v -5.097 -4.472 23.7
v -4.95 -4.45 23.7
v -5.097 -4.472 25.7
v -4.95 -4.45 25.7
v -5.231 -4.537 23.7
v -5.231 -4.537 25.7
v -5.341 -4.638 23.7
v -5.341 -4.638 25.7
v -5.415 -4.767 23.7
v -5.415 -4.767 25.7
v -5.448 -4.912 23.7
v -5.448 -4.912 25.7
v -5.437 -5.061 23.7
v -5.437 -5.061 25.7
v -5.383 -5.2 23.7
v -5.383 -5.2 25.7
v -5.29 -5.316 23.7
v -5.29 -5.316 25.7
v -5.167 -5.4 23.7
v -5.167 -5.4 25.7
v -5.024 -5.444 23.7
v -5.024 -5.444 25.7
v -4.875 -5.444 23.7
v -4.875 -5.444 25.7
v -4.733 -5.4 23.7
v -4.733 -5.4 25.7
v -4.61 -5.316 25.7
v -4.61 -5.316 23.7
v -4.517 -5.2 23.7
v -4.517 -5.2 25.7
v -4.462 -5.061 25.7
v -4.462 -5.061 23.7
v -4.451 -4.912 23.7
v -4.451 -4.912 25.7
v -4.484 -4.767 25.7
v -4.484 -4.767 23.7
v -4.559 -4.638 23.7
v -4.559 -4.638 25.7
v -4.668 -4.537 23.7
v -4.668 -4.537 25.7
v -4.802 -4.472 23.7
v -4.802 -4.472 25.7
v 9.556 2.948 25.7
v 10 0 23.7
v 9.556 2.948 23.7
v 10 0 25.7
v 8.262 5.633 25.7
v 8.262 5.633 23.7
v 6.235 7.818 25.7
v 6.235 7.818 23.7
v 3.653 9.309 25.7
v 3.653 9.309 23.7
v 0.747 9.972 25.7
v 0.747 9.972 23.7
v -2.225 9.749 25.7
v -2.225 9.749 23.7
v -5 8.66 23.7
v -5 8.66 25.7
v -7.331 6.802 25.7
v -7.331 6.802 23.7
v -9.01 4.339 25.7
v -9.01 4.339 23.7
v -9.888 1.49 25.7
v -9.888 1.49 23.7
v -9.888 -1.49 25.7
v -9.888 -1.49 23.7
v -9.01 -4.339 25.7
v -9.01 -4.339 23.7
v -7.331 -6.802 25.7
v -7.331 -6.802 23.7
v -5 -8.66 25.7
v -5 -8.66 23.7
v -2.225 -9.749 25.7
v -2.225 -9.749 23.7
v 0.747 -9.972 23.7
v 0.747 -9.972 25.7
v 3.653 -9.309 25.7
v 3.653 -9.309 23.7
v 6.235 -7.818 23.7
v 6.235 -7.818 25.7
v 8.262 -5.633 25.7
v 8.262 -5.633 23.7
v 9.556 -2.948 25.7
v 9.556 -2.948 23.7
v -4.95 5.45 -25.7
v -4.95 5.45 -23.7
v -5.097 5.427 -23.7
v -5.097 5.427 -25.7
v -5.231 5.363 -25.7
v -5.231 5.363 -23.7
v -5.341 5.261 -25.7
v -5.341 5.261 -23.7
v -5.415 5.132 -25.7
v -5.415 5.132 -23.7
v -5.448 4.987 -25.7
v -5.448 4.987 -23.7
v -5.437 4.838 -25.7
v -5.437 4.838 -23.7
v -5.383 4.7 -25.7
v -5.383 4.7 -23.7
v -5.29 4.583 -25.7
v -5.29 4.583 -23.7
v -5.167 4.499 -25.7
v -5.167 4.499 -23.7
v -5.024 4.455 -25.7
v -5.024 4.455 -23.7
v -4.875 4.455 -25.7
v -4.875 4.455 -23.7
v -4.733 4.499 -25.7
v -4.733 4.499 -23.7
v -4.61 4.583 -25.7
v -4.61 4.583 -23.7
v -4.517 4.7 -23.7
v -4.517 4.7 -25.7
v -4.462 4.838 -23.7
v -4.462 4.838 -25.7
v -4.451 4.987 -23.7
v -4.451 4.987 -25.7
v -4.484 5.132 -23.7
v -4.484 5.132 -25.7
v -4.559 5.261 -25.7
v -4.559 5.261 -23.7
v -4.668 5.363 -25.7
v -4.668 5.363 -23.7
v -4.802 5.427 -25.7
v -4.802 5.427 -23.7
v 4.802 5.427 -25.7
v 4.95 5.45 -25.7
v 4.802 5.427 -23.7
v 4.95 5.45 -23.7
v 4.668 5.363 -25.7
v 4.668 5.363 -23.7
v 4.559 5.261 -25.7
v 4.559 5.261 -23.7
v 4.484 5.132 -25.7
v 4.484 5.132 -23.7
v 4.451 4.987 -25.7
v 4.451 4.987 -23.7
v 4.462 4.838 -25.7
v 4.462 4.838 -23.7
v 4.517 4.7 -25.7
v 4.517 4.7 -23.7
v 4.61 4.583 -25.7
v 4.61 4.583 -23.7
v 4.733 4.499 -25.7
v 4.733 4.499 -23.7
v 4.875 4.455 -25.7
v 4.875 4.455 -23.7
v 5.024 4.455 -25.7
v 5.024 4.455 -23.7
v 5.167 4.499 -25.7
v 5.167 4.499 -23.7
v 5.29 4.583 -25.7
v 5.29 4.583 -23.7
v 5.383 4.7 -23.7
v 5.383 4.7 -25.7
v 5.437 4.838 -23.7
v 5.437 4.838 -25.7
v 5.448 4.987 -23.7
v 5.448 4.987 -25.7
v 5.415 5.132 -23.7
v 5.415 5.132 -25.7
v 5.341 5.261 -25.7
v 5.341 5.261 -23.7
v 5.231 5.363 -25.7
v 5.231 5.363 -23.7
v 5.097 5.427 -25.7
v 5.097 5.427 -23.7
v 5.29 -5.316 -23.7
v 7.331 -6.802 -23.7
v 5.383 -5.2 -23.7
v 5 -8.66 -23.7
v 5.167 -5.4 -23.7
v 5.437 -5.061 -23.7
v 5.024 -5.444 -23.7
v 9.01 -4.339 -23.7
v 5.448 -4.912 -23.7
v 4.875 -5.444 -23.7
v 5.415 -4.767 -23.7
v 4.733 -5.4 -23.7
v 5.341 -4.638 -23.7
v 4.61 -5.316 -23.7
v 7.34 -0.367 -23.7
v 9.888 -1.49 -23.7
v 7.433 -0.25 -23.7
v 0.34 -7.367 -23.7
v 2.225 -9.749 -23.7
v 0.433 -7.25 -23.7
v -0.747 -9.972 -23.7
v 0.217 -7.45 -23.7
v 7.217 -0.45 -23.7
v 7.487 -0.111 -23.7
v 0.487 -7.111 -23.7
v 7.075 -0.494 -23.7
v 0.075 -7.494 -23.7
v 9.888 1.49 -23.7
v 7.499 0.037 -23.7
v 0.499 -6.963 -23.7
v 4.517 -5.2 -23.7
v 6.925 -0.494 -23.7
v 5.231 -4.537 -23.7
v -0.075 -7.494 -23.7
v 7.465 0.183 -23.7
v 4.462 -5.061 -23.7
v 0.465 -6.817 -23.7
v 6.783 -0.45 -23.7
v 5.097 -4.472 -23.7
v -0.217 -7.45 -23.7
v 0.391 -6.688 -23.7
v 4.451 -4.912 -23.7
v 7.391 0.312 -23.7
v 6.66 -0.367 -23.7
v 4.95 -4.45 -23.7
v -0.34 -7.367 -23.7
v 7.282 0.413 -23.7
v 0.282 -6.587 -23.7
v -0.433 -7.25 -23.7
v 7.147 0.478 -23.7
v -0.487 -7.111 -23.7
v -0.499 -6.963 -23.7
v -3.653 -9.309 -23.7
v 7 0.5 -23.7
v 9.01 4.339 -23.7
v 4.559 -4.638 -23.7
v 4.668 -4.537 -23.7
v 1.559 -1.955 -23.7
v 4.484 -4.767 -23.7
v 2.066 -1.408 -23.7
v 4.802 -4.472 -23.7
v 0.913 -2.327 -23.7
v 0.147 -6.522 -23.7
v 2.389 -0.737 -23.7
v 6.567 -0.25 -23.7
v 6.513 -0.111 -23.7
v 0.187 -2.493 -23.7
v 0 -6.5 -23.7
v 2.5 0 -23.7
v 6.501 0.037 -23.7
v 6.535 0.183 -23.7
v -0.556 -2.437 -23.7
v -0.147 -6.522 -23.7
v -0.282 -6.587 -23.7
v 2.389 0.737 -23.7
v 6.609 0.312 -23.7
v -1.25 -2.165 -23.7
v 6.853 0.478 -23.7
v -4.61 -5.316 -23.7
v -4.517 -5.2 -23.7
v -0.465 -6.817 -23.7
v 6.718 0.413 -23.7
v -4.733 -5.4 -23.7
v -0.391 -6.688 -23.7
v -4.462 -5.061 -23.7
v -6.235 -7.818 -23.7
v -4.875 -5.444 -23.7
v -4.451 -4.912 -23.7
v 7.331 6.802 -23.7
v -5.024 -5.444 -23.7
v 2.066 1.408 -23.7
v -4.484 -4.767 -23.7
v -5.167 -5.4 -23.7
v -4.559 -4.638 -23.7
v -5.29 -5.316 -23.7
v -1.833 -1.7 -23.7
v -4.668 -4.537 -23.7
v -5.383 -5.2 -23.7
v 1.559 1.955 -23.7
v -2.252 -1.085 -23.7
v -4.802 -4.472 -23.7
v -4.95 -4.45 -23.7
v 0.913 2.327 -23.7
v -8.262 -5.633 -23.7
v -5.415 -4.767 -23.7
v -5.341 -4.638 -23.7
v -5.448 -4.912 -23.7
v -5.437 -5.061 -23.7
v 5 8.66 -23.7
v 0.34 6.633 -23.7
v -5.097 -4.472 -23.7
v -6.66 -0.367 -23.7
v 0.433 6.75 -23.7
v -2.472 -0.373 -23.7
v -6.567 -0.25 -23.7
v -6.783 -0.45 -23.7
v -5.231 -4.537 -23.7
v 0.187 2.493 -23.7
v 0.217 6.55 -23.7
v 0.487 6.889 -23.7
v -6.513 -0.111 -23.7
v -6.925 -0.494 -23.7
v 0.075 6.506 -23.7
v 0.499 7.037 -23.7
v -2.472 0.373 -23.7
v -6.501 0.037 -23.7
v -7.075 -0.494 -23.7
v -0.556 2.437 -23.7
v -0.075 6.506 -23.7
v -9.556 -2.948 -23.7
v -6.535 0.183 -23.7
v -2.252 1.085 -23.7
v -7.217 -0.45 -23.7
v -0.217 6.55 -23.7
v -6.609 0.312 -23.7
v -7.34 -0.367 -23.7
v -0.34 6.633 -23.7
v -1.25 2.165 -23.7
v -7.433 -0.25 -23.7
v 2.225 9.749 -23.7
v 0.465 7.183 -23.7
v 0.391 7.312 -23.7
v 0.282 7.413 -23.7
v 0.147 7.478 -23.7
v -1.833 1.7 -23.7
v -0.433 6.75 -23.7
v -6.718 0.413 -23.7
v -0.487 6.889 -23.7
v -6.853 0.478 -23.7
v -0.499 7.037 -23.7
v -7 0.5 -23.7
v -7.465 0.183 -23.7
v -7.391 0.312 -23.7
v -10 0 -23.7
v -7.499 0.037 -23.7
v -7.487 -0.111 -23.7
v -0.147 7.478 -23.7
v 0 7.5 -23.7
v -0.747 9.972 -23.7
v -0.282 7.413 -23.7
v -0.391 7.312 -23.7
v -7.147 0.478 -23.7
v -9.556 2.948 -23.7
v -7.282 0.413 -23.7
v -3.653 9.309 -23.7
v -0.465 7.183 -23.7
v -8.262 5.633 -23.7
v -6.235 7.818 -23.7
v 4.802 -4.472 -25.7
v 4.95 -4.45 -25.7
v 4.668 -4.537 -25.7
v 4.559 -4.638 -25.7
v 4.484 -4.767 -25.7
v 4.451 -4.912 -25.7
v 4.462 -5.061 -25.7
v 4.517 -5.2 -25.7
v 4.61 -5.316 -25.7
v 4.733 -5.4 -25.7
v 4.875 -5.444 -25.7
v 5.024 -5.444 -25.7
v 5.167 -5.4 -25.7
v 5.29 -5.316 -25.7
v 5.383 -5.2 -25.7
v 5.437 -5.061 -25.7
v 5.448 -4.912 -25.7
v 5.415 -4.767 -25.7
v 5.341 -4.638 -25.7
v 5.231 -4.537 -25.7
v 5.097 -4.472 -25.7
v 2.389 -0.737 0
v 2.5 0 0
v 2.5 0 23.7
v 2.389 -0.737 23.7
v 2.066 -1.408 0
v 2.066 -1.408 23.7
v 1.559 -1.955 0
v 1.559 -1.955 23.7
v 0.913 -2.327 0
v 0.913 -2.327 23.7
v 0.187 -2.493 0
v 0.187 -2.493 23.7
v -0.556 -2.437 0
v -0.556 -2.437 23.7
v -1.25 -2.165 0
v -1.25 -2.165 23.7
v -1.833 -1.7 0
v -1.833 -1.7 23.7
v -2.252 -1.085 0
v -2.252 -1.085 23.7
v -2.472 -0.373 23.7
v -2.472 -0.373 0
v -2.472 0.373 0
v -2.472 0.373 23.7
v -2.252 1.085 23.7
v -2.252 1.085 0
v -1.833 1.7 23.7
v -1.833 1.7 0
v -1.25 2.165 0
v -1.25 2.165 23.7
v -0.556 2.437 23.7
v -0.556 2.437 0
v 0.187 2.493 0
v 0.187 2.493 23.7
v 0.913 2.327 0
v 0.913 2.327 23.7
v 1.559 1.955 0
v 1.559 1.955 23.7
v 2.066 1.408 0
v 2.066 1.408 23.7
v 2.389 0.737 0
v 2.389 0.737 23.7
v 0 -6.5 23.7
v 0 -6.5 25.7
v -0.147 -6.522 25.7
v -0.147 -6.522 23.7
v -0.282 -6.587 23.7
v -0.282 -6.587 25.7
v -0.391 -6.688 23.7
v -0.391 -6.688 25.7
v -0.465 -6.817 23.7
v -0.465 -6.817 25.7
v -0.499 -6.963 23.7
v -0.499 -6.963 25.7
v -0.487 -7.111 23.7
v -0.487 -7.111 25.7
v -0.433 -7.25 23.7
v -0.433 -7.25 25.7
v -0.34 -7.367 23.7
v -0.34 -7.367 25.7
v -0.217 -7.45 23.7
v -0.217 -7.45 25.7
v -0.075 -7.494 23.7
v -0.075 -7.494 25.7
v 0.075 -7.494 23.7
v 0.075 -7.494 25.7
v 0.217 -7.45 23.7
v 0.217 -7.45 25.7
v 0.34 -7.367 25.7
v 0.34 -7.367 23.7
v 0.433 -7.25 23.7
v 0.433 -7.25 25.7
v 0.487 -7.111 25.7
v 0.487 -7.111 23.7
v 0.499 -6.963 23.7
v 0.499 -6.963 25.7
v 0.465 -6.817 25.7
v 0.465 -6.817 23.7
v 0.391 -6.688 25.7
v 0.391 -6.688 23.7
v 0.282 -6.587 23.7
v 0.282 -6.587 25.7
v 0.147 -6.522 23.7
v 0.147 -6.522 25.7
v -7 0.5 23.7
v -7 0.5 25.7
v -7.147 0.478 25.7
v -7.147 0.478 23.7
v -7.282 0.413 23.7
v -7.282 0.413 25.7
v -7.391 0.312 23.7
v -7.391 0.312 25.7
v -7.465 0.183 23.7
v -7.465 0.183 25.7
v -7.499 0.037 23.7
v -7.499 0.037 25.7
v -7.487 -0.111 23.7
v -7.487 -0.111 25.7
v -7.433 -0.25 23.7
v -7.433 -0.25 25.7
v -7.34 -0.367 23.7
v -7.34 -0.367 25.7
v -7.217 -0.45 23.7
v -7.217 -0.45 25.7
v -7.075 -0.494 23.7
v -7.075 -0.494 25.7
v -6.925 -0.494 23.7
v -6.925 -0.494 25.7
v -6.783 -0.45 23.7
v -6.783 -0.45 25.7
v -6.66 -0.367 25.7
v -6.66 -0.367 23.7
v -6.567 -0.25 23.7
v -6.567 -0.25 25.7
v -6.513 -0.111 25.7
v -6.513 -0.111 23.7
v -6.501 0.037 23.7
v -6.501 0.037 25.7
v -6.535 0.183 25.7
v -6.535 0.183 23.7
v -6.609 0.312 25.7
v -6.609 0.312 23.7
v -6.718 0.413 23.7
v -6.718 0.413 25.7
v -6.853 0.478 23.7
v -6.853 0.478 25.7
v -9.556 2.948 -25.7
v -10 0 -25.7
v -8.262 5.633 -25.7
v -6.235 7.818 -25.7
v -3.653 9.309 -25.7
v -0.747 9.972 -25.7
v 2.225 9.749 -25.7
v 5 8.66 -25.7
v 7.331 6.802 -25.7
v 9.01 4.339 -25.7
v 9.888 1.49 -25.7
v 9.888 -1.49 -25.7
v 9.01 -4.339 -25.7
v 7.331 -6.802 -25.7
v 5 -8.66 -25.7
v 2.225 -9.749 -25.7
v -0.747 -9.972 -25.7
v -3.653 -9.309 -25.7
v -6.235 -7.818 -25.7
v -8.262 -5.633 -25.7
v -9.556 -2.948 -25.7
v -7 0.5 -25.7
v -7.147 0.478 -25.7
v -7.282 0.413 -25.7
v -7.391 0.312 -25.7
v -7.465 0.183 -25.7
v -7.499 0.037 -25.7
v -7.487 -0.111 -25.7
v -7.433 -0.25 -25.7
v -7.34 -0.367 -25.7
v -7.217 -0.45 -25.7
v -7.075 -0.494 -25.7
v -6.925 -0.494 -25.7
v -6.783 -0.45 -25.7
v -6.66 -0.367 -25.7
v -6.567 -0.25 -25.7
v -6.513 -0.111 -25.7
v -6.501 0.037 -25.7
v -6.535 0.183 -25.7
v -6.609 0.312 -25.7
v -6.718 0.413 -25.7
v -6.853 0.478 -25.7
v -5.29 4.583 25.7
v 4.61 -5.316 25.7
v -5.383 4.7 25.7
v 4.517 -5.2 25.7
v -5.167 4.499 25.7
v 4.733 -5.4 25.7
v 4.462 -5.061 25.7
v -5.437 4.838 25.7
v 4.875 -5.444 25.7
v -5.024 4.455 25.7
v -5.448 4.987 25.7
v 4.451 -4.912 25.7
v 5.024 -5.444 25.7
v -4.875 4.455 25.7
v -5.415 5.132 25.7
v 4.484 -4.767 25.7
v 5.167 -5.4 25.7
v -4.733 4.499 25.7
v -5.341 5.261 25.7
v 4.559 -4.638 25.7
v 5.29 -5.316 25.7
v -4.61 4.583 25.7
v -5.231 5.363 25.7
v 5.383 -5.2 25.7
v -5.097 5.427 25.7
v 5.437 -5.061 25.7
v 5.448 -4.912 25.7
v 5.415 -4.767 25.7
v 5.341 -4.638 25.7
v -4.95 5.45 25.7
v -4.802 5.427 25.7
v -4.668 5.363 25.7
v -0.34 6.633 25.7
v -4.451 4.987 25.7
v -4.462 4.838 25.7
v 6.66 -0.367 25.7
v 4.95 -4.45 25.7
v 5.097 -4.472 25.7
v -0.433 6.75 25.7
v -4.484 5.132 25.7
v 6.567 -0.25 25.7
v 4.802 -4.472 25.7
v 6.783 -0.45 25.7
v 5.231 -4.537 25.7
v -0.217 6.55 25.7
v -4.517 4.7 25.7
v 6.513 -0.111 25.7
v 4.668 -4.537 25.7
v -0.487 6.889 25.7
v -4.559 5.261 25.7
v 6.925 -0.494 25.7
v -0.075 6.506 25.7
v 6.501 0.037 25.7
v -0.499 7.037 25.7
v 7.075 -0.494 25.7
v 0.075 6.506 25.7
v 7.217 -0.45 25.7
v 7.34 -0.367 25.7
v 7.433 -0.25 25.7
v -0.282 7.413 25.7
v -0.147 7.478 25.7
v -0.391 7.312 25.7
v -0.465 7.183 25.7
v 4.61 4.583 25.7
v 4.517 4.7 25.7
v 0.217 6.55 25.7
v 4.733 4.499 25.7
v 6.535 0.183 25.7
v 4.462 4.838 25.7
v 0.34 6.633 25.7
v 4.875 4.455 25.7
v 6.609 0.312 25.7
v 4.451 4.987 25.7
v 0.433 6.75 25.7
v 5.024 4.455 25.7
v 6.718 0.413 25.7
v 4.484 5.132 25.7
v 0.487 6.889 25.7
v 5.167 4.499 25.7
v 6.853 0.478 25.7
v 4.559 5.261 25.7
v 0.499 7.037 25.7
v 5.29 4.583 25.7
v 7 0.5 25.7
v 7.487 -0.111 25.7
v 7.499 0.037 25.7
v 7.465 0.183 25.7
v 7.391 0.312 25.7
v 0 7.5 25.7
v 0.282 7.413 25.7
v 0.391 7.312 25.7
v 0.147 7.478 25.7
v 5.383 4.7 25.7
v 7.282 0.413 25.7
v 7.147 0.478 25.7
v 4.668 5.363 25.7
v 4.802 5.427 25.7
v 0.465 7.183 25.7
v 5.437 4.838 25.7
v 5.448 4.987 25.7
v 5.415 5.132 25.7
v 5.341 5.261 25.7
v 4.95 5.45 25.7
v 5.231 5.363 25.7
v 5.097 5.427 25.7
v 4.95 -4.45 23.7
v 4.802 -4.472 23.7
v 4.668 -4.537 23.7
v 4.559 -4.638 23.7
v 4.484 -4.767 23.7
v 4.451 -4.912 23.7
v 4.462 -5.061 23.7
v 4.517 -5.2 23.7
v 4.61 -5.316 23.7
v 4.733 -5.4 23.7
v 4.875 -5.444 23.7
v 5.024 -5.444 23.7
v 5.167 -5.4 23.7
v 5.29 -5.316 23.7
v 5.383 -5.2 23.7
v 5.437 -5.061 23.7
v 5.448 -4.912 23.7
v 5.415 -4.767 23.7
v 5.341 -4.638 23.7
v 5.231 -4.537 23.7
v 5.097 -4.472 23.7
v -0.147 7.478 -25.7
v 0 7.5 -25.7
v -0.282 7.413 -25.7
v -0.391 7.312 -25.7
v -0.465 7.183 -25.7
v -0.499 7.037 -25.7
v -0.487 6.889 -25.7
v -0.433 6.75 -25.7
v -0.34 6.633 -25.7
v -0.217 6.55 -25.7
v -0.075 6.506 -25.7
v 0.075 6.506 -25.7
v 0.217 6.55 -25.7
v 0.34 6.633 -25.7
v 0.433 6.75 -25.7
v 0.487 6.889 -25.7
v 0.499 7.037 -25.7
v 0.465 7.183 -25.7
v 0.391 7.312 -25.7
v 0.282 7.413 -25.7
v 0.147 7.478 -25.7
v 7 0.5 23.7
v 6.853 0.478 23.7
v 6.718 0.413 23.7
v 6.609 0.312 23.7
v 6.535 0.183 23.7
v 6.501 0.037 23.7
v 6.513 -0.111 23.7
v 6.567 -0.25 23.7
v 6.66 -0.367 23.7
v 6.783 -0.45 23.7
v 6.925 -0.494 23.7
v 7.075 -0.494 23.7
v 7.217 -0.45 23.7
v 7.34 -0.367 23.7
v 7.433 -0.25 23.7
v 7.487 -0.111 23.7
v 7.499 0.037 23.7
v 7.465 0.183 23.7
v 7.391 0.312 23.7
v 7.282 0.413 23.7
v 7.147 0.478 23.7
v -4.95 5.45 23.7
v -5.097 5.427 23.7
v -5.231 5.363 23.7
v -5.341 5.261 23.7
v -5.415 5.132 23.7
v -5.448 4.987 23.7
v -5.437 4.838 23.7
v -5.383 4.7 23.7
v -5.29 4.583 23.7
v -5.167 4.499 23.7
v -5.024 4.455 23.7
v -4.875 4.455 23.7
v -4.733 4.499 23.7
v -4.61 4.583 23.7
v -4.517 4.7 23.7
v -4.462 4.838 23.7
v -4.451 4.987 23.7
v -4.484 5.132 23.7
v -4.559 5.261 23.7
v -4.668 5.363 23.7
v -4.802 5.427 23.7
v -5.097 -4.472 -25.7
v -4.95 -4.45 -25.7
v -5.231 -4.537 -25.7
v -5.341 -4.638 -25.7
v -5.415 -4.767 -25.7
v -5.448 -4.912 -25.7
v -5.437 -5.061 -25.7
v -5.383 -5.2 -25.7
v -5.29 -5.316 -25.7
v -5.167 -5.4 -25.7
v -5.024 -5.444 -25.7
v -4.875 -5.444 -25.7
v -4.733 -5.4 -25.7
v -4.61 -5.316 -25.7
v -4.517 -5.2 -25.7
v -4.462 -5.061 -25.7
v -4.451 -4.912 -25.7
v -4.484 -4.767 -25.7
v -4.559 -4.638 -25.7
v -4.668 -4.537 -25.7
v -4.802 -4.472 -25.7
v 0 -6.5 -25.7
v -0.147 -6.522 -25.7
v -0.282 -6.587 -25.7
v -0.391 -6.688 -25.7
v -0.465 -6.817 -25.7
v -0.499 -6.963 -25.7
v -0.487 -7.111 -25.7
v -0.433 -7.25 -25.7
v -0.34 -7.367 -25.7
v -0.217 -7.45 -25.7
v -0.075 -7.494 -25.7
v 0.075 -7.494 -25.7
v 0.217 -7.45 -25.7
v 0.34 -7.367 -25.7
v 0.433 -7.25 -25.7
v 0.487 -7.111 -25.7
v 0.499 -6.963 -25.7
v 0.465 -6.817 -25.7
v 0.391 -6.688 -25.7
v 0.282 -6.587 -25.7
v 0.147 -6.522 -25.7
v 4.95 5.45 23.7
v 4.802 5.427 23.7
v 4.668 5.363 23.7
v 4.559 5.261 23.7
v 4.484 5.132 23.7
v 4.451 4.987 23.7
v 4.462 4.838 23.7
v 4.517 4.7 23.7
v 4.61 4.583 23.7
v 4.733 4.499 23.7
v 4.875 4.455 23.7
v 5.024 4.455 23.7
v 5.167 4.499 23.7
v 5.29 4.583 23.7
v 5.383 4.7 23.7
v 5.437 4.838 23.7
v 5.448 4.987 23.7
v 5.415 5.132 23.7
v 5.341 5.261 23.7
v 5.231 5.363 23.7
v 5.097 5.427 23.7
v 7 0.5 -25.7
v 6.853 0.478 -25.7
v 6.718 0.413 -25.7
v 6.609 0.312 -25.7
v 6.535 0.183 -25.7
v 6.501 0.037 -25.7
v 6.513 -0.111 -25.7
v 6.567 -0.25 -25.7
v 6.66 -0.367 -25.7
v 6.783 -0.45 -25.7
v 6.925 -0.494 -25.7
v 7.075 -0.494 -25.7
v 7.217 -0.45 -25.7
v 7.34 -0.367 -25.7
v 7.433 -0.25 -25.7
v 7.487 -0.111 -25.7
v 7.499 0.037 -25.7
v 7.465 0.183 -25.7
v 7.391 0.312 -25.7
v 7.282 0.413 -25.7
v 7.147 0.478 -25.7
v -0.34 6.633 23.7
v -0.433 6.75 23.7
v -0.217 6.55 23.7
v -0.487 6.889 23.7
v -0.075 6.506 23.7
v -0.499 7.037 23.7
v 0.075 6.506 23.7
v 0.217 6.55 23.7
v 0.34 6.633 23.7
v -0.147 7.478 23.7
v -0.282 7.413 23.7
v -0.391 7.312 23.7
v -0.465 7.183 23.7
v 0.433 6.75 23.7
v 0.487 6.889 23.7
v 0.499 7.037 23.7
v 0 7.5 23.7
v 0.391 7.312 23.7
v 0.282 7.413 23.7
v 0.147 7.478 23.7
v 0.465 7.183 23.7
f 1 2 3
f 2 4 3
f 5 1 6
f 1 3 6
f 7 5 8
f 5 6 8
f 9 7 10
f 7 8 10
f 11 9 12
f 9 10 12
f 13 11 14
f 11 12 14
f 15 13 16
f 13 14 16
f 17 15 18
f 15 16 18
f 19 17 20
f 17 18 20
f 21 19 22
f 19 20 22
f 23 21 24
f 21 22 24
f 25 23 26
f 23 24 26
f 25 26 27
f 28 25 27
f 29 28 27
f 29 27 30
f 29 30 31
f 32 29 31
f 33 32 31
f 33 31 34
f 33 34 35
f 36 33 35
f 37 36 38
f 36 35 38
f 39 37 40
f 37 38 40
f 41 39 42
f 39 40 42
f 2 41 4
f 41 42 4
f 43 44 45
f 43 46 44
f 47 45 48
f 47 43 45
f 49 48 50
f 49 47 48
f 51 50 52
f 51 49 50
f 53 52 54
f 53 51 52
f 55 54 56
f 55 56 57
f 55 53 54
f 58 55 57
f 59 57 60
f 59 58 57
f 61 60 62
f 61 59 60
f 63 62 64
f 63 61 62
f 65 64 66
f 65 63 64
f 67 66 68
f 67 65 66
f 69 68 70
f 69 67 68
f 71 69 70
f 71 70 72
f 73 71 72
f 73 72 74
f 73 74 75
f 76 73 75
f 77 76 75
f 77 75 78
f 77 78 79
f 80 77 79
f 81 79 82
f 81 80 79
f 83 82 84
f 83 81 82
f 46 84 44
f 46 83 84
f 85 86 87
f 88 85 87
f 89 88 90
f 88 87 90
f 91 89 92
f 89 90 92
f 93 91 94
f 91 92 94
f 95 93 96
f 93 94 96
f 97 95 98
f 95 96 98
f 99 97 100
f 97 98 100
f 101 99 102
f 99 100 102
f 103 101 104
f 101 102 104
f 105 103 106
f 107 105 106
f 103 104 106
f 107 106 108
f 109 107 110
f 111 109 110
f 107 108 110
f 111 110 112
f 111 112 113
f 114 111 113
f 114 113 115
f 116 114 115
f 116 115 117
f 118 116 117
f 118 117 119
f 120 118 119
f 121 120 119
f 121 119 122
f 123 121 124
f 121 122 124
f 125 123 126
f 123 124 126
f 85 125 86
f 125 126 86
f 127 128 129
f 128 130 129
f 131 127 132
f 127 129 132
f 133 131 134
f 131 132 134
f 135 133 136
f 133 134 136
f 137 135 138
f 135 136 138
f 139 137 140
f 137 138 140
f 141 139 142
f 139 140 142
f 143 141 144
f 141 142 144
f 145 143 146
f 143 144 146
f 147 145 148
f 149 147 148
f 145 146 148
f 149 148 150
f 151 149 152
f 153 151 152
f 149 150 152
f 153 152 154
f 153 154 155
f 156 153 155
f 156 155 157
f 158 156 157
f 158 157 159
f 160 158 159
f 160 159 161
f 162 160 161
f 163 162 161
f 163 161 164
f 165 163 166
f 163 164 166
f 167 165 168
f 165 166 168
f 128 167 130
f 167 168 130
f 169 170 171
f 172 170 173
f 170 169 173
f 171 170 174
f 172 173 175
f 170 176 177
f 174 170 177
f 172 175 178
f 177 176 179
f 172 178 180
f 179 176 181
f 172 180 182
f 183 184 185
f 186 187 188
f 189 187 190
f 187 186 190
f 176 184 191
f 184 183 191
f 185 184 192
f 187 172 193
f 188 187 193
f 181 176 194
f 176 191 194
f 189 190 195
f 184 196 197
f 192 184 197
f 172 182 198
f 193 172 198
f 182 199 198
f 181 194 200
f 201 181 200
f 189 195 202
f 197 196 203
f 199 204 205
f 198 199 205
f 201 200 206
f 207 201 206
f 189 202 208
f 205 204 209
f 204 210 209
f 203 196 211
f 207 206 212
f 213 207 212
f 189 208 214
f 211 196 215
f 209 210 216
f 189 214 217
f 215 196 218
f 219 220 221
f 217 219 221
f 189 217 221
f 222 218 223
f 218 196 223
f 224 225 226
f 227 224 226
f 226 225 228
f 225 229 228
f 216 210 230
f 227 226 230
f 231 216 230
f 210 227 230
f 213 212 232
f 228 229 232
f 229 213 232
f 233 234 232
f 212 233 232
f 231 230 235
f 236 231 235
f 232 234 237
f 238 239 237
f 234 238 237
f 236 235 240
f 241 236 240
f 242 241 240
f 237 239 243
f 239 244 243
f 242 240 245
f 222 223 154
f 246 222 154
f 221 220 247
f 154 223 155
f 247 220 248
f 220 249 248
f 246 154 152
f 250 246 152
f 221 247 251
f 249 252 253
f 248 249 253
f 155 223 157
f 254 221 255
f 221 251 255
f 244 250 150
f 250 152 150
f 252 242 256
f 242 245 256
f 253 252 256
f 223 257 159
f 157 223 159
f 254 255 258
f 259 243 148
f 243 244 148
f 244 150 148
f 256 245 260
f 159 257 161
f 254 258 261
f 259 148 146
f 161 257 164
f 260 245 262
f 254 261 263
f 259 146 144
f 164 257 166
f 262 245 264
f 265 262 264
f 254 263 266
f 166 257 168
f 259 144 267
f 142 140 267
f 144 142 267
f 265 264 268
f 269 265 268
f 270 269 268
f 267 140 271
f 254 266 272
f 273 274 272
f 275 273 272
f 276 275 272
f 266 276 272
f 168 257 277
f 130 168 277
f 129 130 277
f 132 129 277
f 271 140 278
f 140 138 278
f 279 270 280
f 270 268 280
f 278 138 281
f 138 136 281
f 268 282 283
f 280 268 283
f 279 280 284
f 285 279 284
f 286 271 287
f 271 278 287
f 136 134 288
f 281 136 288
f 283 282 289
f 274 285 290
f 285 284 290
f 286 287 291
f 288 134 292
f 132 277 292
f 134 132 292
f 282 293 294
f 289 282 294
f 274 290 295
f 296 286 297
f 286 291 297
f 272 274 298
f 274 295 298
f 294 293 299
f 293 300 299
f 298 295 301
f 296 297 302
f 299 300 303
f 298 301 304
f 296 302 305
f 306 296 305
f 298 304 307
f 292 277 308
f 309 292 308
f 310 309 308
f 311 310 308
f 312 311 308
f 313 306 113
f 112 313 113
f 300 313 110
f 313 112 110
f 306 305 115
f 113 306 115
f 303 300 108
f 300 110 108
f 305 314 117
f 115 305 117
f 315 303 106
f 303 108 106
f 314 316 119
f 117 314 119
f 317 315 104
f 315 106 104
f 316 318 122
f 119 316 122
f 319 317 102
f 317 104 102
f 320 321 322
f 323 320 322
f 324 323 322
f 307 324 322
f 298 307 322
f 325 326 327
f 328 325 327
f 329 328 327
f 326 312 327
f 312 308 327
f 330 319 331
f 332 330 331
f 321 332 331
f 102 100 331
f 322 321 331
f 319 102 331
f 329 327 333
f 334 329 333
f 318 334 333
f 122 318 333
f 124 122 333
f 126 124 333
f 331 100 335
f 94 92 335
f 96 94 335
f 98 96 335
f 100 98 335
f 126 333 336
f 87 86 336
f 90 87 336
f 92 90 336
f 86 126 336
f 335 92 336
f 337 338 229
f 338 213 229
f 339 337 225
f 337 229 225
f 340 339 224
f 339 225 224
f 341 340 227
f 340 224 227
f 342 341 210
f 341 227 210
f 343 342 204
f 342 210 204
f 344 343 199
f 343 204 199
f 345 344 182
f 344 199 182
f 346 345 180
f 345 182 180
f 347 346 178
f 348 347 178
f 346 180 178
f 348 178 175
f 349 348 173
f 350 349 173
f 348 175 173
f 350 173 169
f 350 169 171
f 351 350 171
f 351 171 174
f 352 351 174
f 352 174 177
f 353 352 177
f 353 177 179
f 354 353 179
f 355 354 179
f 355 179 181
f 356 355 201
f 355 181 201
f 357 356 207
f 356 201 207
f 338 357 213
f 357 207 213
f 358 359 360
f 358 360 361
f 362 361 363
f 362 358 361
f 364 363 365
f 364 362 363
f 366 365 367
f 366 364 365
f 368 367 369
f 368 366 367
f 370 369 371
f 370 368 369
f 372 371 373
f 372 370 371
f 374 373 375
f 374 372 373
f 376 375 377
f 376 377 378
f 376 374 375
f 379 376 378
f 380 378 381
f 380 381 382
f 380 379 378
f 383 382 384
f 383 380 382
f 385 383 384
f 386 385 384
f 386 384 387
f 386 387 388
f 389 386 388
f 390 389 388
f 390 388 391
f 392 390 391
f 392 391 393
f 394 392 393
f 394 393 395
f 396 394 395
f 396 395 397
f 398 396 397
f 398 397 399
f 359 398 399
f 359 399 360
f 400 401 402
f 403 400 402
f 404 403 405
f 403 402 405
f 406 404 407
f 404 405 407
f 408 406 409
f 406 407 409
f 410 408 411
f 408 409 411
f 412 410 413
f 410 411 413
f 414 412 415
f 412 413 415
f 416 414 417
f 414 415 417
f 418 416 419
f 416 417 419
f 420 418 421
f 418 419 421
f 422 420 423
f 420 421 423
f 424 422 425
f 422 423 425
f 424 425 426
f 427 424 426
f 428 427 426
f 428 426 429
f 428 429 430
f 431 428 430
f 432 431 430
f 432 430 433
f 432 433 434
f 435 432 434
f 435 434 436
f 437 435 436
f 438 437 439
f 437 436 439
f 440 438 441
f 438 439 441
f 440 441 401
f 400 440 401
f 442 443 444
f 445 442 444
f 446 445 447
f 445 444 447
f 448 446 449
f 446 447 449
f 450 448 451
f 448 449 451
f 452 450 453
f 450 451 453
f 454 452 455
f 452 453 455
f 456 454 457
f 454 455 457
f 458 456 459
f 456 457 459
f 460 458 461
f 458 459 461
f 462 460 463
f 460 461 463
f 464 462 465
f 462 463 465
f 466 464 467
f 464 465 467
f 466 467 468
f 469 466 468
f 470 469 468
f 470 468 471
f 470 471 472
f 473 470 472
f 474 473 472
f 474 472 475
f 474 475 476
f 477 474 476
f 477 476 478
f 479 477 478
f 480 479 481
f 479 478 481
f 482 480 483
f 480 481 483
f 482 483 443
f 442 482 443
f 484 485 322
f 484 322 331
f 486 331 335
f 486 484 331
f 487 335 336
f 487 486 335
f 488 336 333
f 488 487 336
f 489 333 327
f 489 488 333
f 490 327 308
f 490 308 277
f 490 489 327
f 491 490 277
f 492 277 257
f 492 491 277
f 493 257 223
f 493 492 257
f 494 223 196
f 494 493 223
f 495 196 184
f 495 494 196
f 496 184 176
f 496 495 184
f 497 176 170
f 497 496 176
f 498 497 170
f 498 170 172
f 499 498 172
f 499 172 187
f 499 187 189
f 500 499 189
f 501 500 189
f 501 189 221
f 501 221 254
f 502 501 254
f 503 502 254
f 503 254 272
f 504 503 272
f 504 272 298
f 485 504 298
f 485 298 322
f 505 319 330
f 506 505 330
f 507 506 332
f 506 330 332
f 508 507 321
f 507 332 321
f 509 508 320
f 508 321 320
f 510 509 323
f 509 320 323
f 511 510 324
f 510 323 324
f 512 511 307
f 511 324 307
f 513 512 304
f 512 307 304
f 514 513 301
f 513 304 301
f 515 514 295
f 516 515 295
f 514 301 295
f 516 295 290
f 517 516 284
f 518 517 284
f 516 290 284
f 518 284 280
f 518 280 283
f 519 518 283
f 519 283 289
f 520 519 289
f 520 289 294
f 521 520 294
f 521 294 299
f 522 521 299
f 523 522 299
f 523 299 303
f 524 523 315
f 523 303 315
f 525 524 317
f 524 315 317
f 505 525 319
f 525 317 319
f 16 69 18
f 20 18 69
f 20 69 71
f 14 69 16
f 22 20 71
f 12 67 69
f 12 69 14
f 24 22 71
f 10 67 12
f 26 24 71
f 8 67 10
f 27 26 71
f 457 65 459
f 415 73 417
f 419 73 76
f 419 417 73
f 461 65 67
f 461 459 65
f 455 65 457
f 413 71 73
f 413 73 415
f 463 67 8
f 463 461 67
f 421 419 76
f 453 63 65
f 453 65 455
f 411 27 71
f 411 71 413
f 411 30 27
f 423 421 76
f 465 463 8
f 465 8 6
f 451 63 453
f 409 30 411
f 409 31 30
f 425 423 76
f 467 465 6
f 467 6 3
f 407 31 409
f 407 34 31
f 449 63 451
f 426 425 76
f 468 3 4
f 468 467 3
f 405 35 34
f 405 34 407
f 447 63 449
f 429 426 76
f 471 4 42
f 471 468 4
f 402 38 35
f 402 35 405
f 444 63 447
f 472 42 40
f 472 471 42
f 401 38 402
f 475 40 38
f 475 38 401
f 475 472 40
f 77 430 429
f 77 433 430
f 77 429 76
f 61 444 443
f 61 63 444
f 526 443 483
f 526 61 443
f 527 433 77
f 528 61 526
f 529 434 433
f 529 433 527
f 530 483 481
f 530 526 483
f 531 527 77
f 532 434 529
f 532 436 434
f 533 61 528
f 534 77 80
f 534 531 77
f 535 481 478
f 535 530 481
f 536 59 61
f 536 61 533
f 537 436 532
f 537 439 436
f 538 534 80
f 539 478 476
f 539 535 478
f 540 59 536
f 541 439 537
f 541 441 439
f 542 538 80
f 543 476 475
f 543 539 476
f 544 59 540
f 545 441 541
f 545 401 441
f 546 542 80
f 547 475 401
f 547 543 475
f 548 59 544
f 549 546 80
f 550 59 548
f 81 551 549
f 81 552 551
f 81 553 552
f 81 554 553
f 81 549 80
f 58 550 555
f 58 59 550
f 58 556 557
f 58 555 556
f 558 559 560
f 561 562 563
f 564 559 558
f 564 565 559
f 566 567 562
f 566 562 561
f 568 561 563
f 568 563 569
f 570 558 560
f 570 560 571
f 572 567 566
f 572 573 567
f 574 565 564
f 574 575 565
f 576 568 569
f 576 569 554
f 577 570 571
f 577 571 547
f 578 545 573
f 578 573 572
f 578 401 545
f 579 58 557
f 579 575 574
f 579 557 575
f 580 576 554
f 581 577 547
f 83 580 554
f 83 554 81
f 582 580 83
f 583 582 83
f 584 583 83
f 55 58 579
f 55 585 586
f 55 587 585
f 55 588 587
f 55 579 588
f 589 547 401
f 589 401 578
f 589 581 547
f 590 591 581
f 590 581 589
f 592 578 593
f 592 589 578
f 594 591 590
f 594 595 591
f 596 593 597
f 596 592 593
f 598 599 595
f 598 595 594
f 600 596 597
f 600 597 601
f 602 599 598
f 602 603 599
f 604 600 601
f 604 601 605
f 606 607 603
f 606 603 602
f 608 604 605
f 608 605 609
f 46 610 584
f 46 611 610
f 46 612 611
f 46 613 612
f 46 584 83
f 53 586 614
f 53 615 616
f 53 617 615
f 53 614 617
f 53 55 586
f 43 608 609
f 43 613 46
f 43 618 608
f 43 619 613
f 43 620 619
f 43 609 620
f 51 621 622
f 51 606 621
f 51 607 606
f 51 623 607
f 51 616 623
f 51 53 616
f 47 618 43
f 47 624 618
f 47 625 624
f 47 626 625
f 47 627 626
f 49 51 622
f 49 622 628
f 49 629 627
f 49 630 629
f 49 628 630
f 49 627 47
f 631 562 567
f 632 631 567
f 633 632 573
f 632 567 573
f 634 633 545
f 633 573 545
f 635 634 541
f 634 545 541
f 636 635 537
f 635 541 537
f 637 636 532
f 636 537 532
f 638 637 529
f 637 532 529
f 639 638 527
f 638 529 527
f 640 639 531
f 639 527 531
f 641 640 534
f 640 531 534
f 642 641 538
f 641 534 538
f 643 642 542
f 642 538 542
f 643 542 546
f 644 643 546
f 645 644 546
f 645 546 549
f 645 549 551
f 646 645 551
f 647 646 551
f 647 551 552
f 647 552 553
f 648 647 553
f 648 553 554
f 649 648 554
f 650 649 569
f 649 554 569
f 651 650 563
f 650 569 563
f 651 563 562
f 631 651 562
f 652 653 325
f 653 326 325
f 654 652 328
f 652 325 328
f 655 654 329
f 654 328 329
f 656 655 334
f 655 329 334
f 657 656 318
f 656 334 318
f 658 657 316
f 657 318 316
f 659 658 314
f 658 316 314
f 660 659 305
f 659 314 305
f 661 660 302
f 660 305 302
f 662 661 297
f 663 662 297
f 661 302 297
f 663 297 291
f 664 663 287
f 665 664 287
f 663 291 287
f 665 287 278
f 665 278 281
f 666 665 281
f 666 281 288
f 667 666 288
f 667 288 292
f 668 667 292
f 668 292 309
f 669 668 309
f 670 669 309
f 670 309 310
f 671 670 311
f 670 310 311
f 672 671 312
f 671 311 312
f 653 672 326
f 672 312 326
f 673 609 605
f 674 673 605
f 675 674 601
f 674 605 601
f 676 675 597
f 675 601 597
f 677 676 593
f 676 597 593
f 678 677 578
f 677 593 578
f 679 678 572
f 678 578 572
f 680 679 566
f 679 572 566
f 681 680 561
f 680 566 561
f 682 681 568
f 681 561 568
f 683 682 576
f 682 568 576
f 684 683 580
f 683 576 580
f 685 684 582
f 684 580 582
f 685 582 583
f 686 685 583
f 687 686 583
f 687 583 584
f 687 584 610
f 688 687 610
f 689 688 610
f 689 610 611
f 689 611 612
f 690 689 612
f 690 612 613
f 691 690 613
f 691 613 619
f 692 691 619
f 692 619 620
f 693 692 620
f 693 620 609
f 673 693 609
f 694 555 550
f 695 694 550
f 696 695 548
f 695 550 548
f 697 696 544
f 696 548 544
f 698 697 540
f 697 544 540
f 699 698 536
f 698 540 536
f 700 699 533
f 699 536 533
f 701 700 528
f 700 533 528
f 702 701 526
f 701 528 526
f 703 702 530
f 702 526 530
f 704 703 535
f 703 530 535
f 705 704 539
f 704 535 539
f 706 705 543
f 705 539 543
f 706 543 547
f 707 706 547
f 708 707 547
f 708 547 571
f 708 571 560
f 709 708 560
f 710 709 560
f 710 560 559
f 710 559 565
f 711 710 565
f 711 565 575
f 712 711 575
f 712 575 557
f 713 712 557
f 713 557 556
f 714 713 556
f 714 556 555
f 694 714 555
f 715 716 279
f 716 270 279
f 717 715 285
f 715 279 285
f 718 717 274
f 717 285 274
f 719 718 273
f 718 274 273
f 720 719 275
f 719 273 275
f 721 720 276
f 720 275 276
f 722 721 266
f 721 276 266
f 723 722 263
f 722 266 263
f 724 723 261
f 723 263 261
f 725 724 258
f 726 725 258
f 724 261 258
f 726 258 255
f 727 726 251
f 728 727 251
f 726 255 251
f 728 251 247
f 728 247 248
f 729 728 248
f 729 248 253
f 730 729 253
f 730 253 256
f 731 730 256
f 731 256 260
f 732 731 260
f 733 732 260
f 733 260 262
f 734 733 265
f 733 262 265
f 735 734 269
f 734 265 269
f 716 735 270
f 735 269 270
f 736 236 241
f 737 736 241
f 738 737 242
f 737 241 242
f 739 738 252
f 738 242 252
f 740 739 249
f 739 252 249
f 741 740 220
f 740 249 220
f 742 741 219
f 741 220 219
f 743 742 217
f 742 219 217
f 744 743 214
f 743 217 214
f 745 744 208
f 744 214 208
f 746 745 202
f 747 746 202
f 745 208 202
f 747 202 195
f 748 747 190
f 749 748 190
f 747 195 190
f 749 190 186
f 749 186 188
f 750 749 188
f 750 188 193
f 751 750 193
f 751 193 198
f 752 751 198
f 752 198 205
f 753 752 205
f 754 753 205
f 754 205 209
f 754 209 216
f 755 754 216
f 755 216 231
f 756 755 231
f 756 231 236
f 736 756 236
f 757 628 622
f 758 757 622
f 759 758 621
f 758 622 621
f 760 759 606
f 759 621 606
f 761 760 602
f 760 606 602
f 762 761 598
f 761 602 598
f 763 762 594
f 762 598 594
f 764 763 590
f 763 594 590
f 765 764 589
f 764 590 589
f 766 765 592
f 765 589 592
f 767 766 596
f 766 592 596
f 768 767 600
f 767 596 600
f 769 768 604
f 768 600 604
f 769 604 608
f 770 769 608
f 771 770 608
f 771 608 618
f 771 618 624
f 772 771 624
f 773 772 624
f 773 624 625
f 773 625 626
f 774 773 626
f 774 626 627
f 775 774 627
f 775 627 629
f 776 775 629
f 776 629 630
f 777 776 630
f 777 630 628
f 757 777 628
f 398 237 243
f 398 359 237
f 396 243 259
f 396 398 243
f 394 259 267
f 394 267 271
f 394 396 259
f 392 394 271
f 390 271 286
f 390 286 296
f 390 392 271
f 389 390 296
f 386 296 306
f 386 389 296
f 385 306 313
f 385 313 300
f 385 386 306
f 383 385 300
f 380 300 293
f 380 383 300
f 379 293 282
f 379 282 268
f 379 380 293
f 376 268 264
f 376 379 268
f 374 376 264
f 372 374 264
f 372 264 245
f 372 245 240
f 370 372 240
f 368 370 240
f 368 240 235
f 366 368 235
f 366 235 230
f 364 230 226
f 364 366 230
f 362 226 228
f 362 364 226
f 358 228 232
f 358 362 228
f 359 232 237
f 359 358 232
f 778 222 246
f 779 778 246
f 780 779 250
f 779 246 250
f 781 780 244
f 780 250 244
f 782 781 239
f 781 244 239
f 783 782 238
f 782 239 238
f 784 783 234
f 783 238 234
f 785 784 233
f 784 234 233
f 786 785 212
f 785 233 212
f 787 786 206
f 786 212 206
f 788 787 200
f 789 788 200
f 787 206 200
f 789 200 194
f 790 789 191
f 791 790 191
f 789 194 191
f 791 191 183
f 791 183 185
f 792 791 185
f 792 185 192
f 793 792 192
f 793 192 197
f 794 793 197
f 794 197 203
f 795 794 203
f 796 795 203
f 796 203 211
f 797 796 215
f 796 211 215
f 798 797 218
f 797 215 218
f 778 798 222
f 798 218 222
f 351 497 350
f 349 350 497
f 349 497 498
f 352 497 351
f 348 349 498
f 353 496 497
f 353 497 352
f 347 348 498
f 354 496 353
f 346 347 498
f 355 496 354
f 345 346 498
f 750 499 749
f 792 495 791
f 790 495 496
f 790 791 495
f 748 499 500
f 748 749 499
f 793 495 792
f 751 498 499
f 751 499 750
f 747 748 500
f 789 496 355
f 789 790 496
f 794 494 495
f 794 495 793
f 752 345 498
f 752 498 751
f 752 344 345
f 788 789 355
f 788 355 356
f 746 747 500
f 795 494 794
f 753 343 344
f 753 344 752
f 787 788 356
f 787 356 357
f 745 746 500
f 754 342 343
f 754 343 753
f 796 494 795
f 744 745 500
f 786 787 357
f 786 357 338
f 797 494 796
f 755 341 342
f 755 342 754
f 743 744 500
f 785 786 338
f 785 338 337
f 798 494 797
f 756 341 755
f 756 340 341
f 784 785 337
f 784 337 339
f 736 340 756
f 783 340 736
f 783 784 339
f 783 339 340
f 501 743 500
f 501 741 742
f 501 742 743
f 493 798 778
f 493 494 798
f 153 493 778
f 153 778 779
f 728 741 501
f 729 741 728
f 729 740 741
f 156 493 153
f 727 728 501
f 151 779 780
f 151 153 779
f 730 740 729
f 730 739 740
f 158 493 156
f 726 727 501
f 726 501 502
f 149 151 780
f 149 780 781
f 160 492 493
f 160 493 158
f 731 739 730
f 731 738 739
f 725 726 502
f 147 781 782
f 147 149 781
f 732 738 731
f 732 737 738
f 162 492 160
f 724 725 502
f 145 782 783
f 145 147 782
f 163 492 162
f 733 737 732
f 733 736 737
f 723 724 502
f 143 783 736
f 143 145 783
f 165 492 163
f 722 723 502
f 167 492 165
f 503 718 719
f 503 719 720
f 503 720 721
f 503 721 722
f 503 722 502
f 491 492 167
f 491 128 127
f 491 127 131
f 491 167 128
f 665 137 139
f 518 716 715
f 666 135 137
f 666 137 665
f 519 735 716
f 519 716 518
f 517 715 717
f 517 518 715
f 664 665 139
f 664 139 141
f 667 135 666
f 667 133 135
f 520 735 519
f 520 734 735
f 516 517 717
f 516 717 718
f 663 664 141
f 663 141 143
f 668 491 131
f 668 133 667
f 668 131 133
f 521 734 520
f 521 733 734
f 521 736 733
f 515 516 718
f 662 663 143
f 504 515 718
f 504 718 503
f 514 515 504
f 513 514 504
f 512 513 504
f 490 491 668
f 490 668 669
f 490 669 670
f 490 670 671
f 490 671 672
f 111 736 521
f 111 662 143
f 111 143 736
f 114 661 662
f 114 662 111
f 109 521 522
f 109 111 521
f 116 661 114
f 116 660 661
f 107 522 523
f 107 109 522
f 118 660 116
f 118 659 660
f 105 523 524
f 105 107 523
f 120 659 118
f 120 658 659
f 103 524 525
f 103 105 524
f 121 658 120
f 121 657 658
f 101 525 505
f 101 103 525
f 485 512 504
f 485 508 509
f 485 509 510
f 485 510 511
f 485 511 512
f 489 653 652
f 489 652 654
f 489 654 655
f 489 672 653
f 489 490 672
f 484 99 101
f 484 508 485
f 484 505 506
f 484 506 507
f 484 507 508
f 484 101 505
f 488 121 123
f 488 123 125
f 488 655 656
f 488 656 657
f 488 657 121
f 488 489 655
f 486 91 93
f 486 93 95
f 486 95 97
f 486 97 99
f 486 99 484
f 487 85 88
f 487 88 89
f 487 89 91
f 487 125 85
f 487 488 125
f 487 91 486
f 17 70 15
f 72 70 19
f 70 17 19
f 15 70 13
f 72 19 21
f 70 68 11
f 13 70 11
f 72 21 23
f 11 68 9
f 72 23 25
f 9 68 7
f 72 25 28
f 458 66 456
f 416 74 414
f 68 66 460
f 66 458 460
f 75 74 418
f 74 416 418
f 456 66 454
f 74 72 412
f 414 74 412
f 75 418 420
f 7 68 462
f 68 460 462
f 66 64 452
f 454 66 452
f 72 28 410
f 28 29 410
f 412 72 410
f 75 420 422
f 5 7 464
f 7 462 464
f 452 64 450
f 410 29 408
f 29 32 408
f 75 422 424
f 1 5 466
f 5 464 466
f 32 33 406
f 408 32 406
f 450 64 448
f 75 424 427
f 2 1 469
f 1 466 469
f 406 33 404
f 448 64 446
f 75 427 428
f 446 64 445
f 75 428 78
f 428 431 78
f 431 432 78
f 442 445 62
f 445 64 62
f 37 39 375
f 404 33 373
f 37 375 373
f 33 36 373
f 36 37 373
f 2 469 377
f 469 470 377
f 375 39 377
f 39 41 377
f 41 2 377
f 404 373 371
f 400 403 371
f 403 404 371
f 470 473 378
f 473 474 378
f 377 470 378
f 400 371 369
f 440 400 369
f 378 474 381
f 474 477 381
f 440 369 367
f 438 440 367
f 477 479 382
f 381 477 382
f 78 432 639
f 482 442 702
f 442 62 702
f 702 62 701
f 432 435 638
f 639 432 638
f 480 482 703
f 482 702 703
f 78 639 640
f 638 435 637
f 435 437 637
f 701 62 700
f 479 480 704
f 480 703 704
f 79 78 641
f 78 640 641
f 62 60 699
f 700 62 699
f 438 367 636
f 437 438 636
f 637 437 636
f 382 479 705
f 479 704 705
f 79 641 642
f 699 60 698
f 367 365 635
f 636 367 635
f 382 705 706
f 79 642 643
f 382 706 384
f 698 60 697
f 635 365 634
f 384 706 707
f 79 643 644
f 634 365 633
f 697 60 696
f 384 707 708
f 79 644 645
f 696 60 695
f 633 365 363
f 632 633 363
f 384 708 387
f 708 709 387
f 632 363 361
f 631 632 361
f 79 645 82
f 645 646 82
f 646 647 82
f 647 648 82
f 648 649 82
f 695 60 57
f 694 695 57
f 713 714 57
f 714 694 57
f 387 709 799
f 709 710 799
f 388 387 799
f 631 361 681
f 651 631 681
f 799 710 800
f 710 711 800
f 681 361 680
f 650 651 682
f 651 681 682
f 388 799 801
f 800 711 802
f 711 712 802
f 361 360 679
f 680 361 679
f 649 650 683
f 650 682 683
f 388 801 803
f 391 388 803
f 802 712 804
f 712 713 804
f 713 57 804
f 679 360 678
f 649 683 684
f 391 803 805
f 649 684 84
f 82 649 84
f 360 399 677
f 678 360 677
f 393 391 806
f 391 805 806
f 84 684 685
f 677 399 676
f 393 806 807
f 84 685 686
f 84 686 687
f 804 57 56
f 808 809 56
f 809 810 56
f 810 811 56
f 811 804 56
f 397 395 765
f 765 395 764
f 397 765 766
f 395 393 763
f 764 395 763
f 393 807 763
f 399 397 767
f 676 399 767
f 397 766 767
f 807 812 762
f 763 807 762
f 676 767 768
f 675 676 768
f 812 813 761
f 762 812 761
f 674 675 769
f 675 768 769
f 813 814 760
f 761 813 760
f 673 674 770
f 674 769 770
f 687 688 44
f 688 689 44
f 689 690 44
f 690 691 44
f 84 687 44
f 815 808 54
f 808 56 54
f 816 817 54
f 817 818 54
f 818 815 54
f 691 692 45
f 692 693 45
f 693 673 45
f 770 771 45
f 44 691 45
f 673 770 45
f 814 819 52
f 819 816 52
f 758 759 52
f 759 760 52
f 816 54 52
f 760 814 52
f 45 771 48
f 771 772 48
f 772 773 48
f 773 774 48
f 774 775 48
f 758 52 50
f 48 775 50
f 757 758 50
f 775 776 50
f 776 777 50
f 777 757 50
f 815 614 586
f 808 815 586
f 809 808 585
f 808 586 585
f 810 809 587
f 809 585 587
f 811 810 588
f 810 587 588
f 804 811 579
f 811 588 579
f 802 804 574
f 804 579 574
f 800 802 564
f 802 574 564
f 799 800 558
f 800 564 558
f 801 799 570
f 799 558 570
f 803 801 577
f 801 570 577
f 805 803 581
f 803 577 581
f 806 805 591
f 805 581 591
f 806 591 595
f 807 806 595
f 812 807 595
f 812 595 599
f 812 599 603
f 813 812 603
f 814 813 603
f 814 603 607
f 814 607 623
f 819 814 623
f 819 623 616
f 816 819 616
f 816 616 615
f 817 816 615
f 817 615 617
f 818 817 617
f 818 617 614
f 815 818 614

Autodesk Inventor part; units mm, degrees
ref_plane "YZ Plane" through (0, 0, 0) normal (1, 0, 0) x (0, 1, 0)
ref_plane "XZ Plane" through (0, 0, 0) normal (0, 1, 0) x (-1, 0, 0)
ref_plane "XY Plane" through (0, 0, 0) normal (0, 0, 1) x (1, 0, 0)
sketch "スケッチ1" plane through (0, 0, 0) normal (0, 0, 1) x (1, 0, 0)
  circle A0 centre (0, 0) radius 2.5
  dimension "d0" = 5
extrude "押し出し1" add sketch "スケッチ1" along normal mid plane 51.4
sketch "スケッチ2" plane through (0, 0, 25.7) normal (0, 0, 1) x (1, 0, 0)
  circle A0 centre (0, 0) radius 10
  dimension "d3" = 20
extrude "押し出し2" add sketch "スケッチ2" against normal blind 2
sketch "スケッチ3" plane through (0, 0, -25.7) normal (0, 0, -1) x (-1, 0, 0)
  circle A0 centre (0, 0) radius 10
  dimension "d6" = 20
extrude "押し出し3" add sketch "スケッチ3" against normal blind 2
sketch "スケッチ4" plane through (0, 0, -25.7) normal (0, 0, -1) x (-1, 0, 0)
  point P0 (0, 0)
  point P1 (7, 0)
  point P2 (4.9497, 4.9497)
  point P3 (0, 7)
  point P4 (-4.9497, 4.9497)
  point P5 (-7, 0)
  point P6 (-4.9497, -4.9497)
  point P7 (0, -7)
  point P8 (4.9497, -4.9497)
  dimension "d9" = 7
  dimension "d12" = 360
hole "穴1" at (-7, 0, -25.7) at (-4.9497, 4.9497, -25.7) at (0, 7, -25.7) at (4.9497, 4.9497, -25.7) at (7, 0, -25.7) at (4.9497, -4.9497, -25.7) at (0, -7, -25.7) at (-4.9497, -4.9497, -25.7) direction (0, 0, 1) diameter 1 end through all
properties part number "サーボパーツ2"
